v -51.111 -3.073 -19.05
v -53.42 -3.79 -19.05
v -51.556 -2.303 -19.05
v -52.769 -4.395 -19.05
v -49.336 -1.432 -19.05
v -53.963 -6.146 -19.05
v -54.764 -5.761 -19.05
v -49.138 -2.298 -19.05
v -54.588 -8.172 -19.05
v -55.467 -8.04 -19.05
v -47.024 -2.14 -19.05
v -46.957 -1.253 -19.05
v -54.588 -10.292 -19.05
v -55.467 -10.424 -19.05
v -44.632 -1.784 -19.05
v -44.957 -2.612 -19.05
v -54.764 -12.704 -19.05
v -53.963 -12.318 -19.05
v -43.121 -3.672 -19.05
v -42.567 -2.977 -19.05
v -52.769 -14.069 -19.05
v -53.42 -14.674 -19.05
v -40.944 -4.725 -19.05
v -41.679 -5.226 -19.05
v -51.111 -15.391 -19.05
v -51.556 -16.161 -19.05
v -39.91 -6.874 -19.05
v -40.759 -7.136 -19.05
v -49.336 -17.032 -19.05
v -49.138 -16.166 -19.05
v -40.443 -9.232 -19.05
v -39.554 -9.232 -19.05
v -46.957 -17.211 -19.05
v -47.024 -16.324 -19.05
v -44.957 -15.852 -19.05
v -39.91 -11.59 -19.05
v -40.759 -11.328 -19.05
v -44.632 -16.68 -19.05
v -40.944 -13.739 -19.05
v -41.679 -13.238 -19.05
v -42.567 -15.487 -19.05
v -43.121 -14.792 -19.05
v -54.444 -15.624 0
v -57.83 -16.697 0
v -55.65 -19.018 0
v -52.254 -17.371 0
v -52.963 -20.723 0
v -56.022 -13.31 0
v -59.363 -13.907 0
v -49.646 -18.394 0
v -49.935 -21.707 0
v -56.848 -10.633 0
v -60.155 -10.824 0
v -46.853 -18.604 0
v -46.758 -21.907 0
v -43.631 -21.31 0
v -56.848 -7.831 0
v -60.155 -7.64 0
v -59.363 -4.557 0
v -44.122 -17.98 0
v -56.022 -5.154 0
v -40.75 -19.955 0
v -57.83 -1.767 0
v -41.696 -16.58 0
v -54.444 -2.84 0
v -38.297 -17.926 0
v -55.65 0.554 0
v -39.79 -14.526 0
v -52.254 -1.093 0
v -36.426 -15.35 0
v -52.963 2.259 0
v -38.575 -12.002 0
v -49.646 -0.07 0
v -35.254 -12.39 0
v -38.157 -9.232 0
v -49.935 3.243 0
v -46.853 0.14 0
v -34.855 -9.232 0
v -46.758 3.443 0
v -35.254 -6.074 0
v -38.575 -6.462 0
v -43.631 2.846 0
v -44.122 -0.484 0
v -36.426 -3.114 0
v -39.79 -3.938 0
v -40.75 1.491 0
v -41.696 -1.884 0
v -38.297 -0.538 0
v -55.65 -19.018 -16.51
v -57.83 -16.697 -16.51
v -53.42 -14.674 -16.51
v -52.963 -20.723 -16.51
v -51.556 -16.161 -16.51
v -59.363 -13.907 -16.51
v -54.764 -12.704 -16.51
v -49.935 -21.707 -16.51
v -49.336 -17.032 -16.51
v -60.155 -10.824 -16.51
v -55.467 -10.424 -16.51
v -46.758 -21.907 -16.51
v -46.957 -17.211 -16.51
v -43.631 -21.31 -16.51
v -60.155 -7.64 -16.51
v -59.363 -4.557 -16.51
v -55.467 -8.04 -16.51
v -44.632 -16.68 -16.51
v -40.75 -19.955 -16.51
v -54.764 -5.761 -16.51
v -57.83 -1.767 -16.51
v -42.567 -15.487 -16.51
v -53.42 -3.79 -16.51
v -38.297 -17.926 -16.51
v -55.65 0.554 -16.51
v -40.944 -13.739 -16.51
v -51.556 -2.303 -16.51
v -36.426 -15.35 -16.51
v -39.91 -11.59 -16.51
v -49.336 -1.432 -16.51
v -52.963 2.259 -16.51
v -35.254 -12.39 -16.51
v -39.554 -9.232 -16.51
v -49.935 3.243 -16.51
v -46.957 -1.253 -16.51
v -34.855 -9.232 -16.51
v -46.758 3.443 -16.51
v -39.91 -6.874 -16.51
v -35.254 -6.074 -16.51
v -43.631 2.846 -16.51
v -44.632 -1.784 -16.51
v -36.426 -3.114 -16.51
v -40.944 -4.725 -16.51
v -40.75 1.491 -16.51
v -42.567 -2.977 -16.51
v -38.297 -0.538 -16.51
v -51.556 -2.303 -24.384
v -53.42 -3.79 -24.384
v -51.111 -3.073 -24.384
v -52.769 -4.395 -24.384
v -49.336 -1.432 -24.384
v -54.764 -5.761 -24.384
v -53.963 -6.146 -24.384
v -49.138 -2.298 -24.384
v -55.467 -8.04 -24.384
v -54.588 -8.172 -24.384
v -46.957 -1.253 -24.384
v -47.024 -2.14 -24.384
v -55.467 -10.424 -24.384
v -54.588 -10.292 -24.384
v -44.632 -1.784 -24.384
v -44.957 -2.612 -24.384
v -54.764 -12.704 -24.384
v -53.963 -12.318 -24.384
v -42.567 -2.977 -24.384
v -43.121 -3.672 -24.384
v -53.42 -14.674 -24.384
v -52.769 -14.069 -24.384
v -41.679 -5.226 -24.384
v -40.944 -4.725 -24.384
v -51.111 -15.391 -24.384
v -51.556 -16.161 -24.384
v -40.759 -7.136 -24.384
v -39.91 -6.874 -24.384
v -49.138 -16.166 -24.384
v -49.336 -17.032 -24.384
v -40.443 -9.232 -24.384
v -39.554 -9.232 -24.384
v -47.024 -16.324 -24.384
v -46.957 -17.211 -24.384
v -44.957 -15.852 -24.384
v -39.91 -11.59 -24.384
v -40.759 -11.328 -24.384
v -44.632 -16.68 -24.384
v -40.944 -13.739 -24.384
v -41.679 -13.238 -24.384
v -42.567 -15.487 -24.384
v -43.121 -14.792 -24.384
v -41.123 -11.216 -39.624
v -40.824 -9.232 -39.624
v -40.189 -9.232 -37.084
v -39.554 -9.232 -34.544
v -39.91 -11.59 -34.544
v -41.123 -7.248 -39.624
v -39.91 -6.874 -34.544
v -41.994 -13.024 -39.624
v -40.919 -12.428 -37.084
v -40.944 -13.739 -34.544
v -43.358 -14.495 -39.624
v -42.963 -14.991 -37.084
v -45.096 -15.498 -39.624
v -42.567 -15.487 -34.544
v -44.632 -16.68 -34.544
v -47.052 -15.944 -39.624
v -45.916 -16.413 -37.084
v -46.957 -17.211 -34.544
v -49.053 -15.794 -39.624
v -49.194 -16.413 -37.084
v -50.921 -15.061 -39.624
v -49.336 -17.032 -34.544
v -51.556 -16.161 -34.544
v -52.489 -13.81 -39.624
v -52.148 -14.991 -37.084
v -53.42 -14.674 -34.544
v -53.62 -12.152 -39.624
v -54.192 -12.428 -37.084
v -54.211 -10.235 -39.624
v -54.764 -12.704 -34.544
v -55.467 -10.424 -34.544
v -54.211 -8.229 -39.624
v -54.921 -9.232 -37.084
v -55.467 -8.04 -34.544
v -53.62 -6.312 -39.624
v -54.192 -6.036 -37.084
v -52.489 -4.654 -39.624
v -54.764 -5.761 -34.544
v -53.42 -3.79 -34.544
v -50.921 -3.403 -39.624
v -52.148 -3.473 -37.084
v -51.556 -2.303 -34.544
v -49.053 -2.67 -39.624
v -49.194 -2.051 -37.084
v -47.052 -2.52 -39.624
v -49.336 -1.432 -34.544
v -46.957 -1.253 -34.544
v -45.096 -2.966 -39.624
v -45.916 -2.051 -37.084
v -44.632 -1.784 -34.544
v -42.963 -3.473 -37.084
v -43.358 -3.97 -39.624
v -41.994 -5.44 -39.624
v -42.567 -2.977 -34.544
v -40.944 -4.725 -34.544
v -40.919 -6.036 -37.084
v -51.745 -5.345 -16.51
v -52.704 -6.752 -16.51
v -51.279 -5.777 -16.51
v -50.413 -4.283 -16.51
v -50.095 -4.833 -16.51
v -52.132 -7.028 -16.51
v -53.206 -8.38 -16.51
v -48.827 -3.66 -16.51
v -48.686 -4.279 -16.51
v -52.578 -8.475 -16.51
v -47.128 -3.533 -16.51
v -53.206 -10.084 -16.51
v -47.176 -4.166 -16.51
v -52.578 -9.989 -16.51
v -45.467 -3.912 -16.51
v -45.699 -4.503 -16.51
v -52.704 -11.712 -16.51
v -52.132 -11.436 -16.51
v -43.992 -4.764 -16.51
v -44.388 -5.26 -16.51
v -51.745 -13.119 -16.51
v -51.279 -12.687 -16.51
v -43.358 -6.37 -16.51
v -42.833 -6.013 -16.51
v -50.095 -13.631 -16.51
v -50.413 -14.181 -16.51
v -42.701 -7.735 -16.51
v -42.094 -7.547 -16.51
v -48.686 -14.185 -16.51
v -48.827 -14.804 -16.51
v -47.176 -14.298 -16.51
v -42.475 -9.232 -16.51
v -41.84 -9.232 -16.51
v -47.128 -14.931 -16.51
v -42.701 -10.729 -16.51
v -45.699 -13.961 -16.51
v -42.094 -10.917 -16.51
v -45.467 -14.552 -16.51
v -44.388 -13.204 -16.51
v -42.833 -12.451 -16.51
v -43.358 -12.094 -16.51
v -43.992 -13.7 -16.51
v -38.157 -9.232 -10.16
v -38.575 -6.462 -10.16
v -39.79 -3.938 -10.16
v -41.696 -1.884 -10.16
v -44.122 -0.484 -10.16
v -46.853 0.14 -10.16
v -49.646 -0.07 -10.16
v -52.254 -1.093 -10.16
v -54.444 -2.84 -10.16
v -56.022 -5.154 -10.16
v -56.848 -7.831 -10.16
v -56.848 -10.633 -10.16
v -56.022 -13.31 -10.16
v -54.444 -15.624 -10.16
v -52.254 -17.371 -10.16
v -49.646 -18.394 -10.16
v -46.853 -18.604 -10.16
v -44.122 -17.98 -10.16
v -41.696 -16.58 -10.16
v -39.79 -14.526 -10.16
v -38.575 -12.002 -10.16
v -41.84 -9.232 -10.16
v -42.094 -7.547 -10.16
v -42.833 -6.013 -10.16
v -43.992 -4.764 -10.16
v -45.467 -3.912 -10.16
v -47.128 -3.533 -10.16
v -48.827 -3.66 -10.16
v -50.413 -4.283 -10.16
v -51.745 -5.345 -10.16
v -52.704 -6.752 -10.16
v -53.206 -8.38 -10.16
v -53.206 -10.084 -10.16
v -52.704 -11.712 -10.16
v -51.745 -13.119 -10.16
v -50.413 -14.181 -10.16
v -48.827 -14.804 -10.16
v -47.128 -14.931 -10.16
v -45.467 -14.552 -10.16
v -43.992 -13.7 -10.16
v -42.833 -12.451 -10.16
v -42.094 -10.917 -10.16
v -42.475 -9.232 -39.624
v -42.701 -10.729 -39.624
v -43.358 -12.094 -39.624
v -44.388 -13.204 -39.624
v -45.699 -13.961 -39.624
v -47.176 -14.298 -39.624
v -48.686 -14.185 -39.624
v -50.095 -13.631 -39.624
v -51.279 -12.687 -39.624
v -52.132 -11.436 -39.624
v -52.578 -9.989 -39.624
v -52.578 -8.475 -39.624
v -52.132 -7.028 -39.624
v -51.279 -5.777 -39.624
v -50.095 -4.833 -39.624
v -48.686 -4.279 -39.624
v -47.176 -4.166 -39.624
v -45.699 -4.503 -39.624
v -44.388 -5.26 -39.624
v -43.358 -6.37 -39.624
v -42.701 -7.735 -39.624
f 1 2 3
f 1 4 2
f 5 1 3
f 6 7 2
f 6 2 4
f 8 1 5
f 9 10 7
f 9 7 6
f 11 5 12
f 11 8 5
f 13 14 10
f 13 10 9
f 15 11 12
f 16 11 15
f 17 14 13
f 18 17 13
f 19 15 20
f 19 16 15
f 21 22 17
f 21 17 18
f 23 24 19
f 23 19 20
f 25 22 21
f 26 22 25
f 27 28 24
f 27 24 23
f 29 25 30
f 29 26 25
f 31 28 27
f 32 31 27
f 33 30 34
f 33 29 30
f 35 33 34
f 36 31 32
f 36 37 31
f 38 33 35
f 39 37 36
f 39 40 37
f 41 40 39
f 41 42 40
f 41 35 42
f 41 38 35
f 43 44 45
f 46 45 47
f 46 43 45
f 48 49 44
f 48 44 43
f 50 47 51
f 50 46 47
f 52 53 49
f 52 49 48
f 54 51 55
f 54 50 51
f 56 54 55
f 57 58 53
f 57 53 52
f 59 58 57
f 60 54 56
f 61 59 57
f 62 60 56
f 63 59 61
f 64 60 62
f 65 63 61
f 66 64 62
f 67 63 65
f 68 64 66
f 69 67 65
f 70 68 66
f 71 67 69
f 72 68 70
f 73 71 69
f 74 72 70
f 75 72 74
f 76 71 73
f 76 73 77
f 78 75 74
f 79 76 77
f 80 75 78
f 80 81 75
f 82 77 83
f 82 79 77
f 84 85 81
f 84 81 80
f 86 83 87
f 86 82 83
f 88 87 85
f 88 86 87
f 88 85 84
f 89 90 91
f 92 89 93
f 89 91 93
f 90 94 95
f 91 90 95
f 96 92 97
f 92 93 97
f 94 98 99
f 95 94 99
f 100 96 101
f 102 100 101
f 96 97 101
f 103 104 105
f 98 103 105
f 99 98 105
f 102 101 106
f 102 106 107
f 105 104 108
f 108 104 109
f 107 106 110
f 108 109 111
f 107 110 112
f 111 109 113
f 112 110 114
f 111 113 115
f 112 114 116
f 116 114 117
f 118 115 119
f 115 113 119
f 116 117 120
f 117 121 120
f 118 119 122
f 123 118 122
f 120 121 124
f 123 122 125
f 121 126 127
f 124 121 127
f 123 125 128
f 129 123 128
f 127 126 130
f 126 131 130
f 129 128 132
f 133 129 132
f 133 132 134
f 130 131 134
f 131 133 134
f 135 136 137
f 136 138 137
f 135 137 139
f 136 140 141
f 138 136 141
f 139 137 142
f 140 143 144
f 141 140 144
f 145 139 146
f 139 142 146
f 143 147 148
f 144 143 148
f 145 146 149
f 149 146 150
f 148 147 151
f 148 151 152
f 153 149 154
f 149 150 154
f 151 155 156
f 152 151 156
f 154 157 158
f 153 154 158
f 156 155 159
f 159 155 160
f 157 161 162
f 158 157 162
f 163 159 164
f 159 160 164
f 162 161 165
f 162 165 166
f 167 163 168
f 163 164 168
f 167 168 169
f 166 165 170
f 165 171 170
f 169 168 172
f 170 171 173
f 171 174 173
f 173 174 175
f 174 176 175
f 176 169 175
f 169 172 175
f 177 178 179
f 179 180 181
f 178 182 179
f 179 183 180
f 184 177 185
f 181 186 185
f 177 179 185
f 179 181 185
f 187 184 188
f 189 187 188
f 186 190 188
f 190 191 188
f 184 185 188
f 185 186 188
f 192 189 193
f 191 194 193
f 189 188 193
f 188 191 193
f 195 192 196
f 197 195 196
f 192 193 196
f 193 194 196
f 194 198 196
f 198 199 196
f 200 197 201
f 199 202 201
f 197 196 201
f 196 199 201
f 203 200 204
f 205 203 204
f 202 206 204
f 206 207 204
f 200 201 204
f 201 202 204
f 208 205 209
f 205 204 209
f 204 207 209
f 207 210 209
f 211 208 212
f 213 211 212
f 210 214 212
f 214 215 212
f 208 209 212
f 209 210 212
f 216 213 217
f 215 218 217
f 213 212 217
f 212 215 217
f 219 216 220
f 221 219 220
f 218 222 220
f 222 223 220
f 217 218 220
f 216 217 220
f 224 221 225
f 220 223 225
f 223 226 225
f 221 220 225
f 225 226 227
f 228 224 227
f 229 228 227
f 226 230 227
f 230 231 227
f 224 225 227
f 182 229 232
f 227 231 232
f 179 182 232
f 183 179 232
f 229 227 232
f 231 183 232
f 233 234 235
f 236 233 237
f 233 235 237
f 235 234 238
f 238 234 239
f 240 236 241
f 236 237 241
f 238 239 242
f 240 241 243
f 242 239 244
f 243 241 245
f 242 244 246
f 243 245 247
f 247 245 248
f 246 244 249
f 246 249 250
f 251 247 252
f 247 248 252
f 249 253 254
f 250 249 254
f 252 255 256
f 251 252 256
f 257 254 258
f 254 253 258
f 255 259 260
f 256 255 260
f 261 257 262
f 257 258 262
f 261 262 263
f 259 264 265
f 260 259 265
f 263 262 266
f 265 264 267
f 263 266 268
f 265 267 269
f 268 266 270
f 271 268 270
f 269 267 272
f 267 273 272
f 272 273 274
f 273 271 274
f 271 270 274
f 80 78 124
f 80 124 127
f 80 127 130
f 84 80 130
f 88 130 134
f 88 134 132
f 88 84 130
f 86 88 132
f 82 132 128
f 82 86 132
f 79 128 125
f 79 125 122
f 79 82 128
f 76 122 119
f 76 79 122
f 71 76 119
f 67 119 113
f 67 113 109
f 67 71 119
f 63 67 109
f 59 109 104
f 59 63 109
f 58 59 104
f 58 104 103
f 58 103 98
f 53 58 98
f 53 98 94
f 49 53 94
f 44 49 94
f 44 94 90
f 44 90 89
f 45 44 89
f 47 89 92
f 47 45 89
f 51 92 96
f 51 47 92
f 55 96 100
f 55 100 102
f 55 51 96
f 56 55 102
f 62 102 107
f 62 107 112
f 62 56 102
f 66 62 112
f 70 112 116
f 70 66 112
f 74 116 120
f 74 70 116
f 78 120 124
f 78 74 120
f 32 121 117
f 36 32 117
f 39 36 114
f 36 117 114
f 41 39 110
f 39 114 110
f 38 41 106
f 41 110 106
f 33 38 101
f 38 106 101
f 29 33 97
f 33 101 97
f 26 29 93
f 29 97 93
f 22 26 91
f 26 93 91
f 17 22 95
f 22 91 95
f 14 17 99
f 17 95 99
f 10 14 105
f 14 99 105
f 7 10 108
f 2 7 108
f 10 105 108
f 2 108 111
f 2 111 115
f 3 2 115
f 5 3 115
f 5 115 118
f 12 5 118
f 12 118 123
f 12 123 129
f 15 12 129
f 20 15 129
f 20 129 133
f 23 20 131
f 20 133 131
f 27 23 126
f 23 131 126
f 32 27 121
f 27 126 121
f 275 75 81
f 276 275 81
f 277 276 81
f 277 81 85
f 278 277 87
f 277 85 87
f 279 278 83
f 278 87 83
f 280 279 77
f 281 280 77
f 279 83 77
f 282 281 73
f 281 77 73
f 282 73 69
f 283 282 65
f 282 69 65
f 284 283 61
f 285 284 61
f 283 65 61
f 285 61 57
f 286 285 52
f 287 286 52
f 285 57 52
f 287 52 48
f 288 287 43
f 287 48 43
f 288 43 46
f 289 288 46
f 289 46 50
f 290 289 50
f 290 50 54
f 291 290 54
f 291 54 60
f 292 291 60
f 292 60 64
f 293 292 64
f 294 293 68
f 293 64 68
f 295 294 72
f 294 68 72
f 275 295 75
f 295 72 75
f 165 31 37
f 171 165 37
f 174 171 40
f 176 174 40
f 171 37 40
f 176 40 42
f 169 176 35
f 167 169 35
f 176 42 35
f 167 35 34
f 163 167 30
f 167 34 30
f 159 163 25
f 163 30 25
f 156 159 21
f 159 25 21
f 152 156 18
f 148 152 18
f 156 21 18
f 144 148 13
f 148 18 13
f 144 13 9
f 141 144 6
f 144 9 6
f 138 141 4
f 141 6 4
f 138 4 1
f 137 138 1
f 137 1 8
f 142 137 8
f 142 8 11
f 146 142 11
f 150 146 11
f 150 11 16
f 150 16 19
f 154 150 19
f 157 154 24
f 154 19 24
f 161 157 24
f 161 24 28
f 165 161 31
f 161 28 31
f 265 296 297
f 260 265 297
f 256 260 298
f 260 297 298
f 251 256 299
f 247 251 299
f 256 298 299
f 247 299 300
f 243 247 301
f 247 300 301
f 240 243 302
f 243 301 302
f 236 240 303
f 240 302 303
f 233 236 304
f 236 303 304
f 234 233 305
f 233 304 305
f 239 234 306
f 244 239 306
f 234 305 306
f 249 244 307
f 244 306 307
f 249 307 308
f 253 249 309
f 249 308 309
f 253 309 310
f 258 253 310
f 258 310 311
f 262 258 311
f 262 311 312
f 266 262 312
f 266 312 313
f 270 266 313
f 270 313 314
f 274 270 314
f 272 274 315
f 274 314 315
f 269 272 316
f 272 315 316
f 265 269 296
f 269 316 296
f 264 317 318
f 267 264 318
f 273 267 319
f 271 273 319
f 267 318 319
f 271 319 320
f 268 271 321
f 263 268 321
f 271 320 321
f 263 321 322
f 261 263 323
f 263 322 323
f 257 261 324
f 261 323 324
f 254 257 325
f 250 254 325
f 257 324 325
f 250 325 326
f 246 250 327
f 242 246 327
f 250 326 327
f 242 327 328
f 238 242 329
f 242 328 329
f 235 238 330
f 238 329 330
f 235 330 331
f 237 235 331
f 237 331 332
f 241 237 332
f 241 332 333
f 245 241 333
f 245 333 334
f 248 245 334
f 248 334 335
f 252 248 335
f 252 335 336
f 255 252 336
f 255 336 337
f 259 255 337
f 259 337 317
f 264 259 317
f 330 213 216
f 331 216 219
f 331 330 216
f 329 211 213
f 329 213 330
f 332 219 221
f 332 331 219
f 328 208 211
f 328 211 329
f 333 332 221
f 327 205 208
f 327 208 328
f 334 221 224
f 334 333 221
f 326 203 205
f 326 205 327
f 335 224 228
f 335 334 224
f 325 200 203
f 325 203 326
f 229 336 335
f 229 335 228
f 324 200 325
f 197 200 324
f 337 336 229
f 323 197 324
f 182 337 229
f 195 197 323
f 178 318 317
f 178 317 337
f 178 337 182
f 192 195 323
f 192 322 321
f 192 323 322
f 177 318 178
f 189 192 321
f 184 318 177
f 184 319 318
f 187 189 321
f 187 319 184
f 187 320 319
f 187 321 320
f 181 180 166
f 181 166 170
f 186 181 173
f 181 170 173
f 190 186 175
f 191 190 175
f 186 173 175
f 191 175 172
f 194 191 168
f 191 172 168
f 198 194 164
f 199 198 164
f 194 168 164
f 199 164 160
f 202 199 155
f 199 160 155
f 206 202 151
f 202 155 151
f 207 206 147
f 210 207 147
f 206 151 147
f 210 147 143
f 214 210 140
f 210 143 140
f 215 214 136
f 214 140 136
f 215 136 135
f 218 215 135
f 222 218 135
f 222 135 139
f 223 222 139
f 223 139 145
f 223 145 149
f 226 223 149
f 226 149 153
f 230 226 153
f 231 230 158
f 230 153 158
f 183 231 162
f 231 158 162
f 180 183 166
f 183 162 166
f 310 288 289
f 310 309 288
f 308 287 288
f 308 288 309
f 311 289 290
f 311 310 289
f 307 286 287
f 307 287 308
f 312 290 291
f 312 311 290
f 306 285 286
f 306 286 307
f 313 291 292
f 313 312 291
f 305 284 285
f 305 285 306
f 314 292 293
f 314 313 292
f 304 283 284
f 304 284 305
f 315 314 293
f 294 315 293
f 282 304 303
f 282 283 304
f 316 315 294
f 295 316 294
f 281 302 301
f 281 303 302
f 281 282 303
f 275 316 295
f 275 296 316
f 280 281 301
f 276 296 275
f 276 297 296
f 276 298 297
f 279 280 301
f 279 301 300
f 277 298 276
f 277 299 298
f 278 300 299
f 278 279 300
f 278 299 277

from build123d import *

# Parameters (mm, degrees)
F0_R      = 12.7
F1_DEPTH  = 16.51
F2_R      = 9.398
F3_DEPTH  = 10.16
F4_R      = 5.715
F5_DEPTH  = 6.35
F6_R      = 8.001
F7_DEPTH  = 2.54
F8_R      = 7.112
F9_DEPTH  = 5.334
F10_R     = 8.001
F11_DEPTH = 15.24
F12_SIZE2 = 5.08
F12_SIZE  = 1.27
F13_R     = 5.08
F14_DEPTH = 25.4


with BuildPart() as f1:
    # F0 (on Top) → F1 (new body)
    with BuildSketch(Plane.XY):
        with Locations((-47.5551895797, -9.232012555)):
            Circle(F0_R)
    extrude(amount=-F1_DEPTH)

    # F2 (on face) → F3 (cut)
    with BuildSketch(Plane.XY):
        with Locations((-47.5551895797, -9.232012555)):
            Circle(F2_R)
    extrude(amount=-F3_DEPTH, mode=Mode.SUBTRACT)

    # F4 (on face) → F5 (cut)
    with BuildSketch(Plane.XY.offset(-10.16)):
        with Locations((-47.5551895797, -9.232012555)):
            Circle(F4_R)
    extrude(amount=-F5_DEPTH, mode=Mode.SUBTRACT)

    # F6 (on face) → F7 (join)
    with BuildSketch(Plane(origin=(0, 0, -16.51), x_dir=(1, 0, 0), z_dir=(0, 0, -1))):
        with Locations((-47.5551895797, 9.232012555)):
            Circle(F6_R)
    extrude(amount=F7_DEPTH)

    # F8 (on face) → F9 (join)
    with BuildSketch(Plane(origin=(0, 0, -19.05), x_dir=(1, 0, 0), z_dir=(0, 0, -1))):
        with Locations((-47.5551895797, 9.232012555)):
            Circle(F8_R)
    extrude(amount=F9_DEPTH)

    # F10 (on face) → F11 (join)
    with BuildSketch(Plane(origin=(0, 0, -24.384), x_dir=(1, 0, 0), z_dir=(0, 0, -1))):
        with Locations((-47.5551895797, 9.232012555)):
            Circle(F10_R)
    extrude(amount=F11_DEPTH)

    # F12
    f12_edges = [f1.edges().sort_by_distance(p)[0] for p in [
        (-55.55619, -9.232013, -39.624),
    ]]
    f12_side = f1.faces().sort_by_distance((-47.55519, -9.232013, -39.624))[0]
    chamfer(f12_edges, length=F12_SIZE, length2=F12_SIZE2, reference=f12_side)

    # F13 (on face) → F14 (cut)
    with BuildSketch(Plane(origin=(0, 0, -39.624), x_dir=(1, 0, 0), z_dir=(0, 0, -1))):
        with Locations((-47.5551895797, 9.232012555)):
            Circle(F13_R)
    extrude(amount=-F14_DEPTH, mode=Mode.SUBTRACT)


solid = f1.part
